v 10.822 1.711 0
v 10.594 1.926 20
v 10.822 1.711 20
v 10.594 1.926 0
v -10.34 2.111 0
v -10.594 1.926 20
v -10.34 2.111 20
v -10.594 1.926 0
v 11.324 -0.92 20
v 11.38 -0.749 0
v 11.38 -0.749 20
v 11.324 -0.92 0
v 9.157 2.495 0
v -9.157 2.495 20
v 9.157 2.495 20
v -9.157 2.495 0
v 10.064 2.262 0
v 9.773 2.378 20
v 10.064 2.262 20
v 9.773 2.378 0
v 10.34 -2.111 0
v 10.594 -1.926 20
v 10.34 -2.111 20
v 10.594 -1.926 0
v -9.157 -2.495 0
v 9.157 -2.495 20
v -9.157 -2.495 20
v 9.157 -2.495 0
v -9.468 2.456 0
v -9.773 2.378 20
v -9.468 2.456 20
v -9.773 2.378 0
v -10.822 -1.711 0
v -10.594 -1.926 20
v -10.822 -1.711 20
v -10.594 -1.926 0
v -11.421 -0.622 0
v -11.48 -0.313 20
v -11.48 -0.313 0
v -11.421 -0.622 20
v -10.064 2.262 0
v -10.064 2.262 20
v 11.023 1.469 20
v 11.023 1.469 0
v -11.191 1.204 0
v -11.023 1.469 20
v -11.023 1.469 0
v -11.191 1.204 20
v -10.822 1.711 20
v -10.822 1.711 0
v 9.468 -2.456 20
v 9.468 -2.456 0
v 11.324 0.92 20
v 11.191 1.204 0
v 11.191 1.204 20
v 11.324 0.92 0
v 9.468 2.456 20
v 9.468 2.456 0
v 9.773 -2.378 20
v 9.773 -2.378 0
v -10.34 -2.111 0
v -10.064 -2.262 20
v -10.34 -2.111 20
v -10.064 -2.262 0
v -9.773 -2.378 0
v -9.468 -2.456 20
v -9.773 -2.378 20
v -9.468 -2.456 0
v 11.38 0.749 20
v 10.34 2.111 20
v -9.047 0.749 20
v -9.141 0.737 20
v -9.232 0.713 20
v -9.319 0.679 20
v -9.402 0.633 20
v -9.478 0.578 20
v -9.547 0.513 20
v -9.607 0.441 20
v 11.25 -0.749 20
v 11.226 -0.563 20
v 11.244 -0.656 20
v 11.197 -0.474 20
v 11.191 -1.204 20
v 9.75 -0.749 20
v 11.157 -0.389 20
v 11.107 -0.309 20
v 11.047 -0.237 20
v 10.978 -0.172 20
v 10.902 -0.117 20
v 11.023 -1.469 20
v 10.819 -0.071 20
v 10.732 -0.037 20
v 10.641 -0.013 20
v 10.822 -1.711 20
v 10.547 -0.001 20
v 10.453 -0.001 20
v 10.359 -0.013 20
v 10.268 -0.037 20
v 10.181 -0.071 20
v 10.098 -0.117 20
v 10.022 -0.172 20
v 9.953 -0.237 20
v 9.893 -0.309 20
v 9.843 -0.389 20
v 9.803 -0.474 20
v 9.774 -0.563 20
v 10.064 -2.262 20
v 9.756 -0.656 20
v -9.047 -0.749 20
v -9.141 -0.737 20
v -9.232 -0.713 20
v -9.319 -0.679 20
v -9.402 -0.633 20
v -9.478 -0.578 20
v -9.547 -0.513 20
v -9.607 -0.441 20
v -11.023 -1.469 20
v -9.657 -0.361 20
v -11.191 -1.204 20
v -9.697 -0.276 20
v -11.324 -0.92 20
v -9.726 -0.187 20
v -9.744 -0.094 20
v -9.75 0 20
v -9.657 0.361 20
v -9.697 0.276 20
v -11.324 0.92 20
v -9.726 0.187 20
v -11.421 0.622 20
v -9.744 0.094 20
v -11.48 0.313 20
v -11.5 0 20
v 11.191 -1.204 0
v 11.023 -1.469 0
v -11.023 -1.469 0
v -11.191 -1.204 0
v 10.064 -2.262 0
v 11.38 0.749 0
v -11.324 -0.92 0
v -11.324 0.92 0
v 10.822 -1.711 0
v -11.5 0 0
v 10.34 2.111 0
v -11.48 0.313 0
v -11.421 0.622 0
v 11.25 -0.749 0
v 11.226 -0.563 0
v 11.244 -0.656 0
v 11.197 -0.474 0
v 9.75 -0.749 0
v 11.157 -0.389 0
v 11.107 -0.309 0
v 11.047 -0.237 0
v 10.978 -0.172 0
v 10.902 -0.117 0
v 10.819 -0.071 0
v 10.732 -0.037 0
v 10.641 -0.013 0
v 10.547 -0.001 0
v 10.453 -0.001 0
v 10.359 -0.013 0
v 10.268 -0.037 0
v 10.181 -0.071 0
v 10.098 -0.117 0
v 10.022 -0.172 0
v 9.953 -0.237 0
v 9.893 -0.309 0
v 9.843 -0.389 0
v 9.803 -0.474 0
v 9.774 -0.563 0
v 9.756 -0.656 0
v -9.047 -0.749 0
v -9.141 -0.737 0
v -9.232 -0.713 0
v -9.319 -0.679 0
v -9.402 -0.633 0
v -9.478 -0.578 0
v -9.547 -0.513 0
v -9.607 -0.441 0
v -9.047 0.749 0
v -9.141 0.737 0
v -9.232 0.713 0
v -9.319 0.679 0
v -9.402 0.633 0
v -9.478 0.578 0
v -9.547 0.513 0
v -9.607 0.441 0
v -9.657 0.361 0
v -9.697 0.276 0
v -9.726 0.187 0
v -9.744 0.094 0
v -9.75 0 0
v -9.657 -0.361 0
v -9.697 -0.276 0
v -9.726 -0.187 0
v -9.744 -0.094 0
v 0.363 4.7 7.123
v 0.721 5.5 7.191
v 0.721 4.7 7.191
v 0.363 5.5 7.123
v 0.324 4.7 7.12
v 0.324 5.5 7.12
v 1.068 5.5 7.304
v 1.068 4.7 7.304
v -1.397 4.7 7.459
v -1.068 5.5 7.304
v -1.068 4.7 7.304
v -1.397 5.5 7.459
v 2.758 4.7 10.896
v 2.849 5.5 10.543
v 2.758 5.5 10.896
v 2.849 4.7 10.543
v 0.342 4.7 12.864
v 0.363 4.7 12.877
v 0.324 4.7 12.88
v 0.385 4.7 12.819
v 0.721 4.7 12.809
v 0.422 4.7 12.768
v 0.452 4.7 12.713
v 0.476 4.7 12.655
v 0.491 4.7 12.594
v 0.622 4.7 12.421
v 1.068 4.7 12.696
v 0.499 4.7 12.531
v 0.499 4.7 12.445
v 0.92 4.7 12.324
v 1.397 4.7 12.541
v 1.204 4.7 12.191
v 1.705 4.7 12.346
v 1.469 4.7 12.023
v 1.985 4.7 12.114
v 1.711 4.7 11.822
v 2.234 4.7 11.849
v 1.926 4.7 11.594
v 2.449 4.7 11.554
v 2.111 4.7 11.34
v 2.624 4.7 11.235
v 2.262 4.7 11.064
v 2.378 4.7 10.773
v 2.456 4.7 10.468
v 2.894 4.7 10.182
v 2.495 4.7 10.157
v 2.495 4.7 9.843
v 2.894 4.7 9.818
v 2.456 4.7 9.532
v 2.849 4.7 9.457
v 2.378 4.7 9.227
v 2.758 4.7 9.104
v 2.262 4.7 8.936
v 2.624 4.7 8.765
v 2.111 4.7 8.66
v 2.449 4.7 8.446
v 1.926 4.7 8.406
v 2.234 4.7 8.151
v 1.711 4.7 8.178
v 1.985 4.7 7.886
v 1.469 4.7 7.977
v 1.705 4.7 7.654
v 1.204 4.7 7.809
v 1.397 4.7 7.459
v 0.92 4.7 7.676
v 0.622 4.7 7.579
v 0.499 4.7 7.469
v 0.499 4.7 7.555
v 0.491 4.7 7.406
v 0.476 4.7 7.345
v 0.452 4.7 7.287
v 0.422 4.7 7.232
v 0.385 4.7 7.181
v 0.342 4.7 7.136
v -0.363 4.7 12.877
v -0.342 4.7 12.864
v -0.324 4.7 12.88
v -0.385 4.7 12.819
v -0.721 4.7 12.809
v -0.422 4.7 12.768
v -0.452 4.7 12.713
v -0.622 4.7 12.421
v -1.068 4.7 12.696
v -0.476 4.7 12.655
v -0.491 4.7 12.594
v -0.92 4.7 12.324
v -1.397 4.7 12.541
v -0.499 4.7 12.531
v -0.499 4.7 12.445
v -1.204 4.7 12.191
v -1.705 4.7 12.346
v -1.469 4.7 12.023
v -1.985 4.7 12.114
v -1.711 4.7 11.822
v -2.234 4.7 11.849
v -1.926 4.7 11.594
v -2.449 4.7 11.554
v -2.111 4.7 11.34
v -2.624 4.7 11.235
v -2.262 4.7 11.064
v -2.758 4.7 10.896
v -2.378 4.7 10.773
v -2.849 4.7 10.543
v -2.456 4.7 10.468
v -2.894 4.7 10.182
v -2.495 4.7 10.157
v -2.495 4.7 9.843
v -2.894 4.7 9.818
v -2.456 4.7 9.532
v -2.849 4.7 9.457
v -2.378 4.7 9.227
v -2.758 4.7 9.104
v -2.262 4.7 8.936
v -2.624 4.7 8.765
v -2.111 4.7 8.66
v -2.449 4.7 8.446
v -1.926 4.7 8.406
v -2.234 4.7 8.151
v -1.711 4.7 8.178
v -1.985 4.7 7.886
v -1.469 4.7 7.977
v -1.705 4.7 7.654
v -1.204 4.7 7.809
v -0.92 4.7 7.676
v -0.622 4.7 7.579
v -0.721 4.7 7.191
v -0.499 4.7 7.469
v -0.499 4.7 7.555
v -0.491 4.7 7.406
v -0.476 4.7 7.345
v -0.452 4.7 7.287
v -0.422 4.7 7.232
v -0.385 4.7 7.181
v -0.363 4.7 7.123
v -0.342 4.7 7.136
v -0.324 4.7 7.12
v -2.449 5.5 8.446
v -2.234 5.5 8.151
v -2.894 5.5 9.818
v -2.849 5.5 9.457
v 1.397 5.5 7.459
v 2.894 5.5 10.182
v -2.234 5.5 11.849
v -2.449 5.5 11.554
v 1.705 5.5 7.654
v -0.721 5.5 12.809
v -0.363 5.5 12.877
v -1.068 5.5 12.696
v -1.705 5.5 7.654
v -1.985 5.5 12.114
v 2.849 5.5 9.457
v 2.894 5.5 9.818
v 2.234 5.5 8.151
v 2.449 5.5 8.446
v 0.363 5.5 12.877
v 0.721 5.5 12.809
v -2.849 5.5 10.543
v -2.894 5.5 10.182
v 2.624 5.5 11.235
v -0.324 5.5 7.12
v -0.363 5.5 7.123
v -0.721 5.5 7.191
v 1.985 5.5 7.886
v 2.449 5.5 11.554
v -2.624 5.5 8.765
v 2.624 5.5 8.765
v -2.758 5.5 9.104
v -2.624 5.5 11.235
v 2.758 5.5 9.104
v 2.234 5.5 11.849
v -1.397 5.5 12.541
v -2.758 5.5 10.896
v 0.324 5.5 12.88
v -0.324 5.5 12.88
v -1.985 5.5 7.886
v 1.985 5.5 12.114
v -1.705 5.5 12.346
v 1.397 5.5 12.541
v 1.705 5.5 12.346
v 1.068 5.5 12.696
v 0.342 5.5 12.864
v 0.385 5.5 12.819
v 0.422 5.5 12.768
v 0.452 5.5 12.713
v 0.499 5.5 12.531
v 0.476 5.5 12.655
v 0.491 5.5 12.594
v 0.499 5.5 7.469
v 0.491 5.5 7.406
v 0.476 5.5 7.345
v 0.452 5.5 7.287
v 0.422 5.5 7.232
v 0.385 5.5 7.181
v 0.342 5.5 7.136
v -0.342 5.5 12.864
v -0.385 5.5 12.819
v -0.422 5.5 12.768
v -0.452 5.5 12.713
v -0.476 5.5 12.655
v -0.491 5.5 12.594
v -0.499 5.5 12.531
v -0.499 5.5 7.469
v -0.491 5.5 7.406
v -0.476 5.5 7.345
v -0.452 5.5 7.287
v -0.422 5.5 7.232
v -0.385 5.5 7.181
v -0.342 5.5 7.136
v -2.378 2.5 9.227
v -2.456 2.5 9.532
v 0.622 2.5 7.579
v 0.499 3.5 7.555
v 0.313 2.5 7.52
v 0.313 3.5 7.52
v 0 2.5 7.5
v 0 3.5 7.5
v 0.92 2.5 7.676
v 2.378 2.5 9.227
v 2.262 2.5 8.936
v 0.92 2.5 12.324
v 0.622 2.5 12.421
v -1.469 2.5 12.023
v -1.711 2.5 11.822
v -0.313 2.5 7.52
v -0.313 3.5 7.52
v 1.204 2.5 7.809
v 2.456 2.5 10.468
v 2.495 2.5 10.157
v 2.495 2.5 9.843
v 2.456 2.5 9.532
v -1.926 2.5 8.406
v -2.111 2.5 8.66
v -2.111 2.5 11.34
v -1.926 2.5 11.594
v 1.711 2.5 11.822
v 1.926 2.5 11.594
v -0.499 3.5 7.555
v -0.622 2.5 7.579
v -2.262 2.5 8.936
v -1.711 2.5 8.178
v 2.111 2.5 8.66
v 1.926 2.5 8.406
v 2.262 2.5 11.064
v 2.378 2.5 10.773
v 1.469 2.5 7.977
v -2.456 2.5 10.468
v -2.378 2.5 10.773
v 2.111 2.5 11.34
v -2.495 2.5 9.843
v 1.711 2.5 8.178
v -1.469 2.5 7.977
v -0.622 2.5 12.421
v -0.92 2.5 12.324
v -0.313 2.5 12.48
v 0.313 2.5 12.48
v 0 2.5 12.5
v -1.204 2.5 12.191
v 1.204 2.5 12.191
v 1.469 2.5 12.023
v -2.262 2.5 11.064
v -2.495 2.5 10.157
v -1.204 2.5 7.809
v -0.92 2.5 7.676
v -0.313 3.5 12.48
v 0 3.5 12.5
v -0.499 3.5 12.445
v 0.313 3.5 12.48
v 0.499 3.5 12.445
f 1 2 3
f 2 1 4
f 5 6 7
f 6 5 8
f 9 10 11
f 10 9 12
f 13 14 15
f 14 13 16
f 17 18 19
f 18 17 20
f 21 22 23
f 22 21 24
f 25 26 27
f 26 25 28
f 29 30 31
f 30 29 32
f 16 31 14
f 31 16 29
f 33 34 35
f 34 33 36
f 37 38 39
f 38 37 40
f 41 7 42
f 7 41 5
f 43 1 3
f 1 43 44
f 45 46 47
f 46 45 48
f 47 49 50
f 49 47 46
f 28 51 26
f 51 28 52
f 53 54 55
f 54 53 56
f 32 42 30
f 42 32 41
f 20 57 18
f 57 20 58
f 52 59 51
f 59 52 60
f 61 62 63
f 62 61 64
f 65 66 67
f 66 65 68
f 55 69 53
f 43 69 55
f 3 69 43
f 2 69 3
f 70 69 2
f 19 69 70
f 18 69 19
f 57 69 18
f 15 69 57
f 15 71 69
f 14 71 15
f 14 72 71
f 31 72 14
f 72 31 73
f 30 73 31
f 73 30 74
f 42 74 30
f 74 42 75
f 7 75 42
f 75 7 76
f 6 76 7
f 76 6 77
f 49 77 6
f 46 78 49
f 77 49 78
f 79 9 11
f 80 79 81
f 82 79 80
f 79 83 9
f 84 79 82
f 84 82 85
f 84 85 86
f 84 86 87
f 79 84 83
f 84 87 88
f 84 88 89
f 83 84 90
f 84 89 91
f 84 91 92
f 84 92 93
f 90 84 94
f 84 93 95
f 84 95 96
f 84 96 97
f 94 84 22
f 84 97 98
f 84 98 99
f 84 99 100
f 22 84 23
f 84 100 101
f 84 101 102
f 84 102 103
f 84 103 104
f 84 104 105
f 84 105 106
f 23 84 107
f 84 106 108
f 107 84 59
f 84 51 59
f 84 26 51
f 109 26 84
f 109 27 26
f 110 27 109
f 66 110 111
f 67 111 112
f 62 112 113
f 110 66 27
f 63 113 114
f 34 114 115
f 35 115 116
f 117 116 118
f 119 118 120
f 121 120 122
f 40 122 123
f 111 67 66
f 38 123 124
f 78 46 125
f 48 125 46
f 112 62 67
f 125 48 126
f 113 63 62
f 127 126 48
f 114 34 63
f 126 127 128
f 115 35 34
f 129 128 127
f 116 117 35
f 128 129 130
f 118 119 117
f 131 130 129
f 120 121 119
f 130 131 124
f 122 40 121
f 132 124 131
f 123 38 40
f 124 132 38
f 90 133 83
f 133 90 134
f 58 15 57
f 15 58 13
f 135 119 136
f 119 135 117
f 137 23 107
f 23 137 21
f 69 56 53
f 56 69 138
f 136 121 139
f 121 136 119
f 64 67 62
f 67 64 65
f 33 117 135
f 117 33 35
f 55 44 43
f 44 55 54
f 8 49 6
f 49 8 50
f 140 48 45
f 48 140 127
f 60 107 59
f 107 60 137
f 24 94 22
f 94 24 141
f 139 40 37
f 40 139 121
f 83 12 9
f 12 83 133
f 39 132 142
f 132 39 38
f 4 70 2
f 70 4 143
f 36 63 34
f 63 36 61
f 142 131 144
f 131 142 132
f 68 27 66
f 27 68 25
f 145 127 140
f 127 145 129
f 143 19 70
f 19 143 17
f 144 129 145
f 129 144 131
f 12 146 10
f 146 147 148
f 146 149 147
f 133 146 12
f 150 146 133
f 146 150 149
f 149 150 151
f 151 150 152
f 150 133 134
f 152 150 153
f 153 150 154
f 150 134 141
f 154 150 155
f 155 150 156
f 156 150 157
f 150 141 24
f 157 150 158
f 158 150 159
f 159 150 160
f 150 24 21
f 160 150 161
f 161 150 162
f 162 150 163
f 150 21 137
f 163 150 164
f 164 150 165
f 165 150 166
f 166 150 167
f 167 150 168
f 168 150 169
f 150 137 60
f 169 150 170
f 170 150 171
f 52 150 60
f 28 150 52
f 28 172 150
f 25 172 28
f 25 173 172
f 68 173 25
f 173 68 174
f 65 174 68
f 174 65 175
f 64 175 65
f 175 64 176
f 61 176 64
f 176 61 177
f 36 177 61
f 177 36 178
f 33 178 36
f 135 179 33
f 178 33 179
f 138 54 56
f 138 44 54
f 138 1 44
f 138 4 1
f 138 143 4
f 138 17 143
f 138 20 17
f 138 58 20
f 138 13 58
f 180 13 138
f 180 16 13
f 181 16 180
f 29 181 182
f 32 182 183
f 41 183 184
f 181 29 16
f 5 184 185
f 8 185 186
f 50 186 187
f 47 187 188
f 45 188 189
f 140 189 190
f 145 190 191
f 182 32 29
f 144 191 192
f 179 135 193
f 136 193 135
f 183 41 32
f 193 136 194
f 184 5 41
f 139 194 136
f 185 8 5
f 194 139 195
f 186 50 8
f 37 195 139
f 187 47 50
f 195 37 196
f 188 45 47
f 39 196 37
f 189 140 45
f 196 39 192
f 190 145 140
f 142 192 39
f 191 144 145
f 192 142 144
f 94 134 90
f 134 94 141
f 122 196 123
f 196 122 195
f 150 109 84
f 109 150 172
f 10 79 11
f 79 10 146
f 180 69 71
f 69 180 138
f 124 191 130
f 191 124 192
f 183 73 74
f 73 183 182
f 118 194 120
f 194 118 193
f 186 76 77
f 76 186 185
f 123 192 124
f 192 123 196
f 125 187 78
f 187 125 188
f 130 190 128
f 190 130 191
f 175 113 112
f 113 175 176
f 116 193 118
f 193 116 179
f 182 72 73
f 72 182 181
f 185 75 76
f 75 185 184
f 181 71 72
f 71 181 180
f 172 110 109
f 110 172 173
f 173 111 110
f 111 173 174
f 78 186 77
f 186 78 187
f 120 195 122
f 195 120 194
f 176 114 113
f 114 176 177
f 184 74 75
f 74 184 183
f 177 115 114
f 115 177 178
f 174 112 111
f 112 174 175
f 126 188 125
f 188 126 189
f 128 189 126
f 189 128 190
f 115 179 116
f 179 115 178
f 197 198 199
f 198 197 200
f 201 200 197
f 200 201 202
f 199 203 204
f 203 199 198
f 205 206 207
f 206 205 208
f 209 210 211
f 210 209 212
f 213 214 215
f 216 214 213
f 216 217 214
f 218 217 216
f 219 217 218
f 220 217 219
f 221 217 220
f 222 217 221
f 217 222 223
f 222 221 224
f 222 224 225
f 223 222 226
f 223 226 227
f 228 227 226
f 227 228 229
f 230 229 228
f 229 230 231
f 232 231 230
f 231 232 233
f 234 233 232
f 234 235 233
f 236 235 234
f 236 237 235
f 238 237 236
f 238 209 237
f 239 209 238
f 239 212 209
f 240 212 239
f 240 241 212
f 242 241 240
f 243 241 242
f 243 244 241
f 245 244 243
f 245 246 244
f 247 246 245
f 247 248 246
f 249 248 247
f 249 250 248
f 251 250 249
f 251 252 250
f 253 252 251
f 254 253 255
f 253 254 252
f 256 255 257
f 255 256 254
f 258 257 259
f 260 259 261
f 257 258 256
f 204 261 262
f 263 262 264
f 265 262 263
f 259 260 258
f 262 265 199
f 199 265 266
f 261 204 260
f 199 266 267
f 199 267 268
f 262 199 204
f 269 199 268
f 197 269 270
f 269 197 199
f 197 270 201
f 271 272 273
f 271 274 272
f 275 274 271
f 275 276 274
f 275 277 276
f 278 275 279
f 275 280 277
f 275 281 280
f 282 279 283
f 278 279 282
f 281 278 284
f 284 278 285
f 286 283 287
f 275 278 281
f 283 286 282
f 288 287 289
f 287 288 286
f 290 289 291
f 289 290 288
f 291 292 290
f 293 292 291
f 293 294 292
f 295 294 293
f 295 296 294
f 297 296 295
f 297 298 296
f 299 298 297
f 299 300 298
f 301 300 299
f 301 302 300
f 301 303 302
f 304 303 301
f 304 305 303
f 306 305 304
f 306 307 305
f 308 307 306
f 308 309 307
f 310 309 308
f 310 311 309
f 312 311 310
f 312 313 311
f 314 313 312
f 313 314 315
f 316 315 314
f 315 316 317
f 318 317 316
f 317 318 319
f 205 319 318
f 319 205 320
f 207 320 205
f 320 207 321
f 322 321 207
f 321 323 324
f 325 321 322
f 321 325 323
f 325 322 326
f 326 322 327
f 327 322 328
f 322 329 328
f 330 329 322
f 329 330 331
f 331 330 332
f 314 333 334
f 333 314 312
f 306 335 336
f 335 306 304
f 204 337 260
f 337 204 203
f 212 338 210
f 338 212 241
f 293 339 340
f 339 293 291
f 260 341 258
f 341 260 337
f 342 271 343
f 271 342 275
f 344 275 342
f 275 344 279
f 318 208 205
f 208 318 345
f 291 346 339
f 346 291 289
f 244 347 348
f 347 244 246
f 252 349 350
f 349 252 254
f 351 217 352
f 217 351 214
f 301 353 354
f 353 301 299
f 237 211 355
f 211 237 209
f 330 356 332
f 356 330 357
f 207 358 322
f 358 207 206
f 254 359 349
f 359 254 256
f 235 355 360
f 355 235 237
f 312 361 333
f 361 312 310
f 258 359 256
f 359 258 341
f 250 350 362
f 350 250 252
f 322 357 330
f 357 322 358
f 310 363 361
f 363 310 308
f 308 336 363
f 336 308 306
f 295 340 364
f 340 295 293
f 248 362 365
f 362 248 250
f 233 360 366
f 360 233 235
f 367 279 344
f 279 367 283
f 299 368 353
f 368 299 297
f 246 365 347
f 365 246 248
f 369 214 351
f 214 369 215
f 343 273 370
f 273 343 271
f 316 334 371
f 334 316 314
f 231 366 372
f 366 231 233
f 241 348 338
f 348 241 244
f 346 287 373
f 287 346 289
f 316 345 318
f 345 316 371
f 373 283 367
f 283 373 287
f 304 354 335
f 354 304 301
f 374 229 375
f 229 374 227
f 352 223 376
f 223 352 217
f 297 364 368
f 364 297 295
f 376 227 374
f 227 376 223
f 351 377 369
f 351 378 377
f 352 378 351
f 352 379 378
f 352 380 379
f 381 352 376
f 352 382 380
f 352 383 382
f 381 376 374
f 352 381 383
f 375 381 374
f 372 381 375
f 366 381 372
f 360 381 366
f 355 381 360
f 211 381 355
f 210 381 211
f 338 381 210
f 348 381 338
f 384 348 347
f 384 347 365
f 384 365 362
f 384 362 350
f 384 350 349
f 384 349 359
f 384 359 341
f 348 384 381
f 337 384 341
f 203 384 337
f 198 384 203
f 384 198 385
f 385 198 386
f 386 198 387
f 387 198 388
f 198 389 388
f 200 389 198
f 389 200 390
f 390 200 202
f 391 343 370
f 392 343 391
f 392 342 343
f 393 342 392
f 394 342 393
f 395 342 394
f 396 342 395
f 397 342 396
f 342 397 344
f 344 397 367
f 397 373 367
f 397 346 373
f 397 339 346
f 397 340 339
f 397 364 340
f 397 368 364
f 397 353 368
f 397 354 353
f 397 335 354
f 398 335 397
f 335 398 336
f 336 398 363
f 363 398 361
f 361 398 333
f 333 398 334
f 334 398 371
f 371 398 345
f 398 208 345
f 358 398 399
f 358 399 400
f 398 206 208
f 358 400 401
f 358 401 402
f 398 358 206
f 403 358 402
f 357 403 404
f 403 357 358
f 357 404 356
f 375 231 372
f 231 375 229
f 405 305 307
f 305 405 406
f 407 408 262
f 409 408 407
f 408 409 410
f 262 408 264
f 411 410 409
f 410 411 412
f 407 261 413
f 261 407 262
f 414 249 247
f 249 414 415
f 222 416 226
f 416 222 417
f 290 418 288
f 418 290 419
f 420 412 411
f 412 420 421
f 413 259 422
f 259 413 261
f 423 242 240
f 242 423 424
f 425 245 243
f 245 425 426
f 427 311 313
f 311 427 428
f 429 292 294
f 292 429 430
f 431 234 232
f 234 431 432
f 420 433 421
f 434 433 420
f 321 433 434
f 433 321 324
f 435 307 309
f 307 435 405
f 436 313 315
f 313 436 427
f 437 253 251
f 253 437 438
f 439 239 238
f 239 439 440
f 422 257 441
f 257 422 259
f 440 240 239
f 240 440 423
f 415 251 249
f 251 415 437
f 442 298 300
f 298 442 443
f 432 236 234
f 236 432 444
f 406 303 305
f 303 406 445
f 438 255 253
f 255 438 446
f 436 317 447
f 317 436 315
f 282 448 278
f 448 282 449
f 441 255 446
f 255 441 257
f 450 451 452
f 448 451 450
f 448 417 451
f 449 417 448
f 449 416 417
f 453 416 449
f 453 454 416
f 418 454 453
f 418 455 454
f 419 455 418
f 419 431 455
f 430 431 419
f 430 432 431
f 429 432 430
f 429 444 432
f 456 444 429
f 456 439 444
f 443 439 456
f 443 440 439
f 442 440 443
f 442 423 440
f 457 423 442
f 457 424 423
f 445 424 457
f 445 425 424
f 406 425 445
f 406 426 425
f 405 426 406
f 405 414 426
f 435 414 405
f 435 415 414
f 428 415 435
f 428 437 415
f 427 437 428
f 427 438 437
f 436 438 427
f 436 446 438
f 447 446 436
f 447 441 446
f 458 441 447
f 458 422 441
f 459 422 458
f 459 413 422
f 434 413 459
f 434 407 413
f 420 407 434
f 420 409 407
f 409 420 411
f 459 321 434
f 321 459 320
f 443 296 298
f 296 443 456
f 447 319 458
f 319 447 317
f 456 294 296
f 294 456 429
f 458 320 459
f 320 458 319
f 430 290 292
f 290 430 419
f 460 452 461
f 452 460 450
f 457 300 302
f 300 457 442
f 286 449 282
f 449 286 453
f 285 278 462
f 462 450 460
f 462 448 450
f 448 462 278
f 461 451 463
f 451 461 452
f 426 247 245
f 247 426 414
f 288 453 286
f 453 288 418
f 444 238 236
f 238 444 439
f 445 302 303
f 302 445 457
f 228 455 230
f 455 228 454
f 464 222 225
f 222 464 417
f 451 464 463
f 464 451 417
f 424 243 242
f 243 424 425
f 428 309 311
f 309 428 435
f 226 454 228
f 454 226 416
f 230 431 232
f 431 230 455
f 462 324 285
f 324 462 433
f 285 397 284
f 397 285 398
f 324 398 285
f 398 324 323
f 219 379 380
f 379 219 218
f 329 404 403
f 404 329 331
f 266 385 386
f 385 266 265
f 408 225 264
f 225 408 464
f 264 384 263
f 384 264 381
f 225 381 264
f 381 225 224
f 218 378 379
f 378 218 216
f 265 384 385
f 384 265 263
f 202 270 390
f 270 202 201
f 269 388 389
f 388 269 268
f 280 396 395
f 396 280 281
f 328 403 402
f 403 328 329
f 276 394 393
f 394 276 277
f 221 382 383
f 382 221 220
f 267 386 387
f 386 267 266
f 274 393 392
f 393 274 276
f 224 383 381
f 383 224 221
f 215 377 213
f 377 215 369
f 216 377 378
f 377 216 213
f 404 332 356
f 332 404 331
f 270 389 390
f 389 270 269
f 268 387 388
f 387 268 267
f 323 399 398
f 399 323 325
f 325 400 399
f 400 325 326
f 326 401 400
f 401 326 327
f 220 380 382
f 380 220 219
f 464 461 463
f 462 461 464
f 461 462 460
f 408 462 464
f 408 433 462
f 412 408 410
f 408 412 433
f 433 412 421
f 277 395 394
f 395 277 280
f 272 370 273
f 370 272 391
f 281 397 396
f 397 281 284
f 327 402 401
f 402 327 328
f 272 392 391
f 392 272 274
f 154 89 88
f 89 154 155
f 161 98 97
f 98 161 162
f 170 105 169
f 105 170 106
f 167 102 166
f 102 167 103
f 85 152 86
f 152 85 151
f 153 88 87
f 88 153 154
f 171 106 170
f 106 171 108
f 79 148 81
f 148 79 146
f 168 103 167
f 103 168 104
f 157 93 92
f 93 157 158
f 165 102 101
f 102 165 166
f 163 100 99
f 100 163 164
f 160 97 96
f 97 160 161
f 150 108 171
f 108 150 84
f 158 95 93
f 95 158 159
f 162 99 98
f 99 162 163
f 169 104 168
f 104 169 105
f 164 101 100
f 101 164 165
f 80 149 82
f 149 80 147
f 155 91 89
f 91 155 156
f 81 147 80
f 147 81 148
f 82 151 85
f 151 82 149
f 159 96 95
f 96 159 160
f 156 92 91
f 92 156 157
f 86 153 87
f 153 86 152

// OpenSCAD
WIDTH = 23;
LENGTH = WIDTH;
CORNER_DIA = 5;
BASE_THICKNESS = 3;
RETAINER_THICKNESS = 5;
RETAINER_DIA = WIDTH;

COMPASS_DIA = 20;
HOLE_DIA = 5;
HOLE_TOP_DIA = 6;

WEBBING_THICKNESS = 1.5;
WEBBING_WIDTH = 20;
CLIP_THICKNESS = 5;


$fn = 50;

module rounded_rect(w, l, h, d) {
    hull() {
        for(i = [-1, 1]) {
            for(j = [-1, 1]) {
                translate([i * (w-d)/2, j*(l-d)/2, 0])
                cylinder(d = d, h = h);
            }
        }
    }
}

module retainer() {
    difference() {
        union() {
            rounded_rect(WIDTH, LENGTH, BASE_THICKNESS, CORNER_DIA);
            cylinder(d = RETAINER_DIA, h = RETAINER_THICKNESS + BASE_THICKNESS);
        }

        cylinder(d = HOLE_DIA, h = BASE_THICKNESS);
        translate([0, 0, BASE_THICKNESS - 1])
        cylinder(d = HOLE_TOP_DIA, h = 1);
        translate([0, 0, BASE_THICKNESS])
        cylinder(d = COMPASS_DIA, h = RETAINER_THICKNESS);
    }
}

module retainer_clip() {
    union() {
        difference() {
            rounded_rect(WIDTH, CLIP_THICKNESS, WEBBING_WIDTH, CLIP_THICKNESS);
            translate([(CLIP_THICKNESS-WEBBING_THICKNESS)/2, 0, 0])
            rounded_rect(WIDTH, WEBBING_THICKNESS, WEBBING_WIDTH, WEBBING_THICKNESS);
        }
        translate([WEBBING_WIDTH/2+WEBBING_THICKNESS/3, -WEBBING_THICKNESS/2, 0])
        rounded_rect(WEBBING_THICKNESS, WEBBING_THICKNESS, WEBBING_WIDTH, WEBBING_THICKNESS);

        translate([0, BASE_THICKNESS+CLIP_THICKNESS/2, WEBBING_WIDTH/2])
        rotate([90, 90, 0])
        nub();
    }
}

module nub() {
    difference() {
        union() {
            cylinder(d = HOLE_TOP_DIA-0.2, h = 0.8);
            cylinder(d = HOLE_DIA, h = BASE_THICKNESS);
        }
        rounded_rect(HOLE_TOP_DIA, 1, BASE_THICKNESS-1, 1);
    }
}

//retainer();
retainer_clip();
